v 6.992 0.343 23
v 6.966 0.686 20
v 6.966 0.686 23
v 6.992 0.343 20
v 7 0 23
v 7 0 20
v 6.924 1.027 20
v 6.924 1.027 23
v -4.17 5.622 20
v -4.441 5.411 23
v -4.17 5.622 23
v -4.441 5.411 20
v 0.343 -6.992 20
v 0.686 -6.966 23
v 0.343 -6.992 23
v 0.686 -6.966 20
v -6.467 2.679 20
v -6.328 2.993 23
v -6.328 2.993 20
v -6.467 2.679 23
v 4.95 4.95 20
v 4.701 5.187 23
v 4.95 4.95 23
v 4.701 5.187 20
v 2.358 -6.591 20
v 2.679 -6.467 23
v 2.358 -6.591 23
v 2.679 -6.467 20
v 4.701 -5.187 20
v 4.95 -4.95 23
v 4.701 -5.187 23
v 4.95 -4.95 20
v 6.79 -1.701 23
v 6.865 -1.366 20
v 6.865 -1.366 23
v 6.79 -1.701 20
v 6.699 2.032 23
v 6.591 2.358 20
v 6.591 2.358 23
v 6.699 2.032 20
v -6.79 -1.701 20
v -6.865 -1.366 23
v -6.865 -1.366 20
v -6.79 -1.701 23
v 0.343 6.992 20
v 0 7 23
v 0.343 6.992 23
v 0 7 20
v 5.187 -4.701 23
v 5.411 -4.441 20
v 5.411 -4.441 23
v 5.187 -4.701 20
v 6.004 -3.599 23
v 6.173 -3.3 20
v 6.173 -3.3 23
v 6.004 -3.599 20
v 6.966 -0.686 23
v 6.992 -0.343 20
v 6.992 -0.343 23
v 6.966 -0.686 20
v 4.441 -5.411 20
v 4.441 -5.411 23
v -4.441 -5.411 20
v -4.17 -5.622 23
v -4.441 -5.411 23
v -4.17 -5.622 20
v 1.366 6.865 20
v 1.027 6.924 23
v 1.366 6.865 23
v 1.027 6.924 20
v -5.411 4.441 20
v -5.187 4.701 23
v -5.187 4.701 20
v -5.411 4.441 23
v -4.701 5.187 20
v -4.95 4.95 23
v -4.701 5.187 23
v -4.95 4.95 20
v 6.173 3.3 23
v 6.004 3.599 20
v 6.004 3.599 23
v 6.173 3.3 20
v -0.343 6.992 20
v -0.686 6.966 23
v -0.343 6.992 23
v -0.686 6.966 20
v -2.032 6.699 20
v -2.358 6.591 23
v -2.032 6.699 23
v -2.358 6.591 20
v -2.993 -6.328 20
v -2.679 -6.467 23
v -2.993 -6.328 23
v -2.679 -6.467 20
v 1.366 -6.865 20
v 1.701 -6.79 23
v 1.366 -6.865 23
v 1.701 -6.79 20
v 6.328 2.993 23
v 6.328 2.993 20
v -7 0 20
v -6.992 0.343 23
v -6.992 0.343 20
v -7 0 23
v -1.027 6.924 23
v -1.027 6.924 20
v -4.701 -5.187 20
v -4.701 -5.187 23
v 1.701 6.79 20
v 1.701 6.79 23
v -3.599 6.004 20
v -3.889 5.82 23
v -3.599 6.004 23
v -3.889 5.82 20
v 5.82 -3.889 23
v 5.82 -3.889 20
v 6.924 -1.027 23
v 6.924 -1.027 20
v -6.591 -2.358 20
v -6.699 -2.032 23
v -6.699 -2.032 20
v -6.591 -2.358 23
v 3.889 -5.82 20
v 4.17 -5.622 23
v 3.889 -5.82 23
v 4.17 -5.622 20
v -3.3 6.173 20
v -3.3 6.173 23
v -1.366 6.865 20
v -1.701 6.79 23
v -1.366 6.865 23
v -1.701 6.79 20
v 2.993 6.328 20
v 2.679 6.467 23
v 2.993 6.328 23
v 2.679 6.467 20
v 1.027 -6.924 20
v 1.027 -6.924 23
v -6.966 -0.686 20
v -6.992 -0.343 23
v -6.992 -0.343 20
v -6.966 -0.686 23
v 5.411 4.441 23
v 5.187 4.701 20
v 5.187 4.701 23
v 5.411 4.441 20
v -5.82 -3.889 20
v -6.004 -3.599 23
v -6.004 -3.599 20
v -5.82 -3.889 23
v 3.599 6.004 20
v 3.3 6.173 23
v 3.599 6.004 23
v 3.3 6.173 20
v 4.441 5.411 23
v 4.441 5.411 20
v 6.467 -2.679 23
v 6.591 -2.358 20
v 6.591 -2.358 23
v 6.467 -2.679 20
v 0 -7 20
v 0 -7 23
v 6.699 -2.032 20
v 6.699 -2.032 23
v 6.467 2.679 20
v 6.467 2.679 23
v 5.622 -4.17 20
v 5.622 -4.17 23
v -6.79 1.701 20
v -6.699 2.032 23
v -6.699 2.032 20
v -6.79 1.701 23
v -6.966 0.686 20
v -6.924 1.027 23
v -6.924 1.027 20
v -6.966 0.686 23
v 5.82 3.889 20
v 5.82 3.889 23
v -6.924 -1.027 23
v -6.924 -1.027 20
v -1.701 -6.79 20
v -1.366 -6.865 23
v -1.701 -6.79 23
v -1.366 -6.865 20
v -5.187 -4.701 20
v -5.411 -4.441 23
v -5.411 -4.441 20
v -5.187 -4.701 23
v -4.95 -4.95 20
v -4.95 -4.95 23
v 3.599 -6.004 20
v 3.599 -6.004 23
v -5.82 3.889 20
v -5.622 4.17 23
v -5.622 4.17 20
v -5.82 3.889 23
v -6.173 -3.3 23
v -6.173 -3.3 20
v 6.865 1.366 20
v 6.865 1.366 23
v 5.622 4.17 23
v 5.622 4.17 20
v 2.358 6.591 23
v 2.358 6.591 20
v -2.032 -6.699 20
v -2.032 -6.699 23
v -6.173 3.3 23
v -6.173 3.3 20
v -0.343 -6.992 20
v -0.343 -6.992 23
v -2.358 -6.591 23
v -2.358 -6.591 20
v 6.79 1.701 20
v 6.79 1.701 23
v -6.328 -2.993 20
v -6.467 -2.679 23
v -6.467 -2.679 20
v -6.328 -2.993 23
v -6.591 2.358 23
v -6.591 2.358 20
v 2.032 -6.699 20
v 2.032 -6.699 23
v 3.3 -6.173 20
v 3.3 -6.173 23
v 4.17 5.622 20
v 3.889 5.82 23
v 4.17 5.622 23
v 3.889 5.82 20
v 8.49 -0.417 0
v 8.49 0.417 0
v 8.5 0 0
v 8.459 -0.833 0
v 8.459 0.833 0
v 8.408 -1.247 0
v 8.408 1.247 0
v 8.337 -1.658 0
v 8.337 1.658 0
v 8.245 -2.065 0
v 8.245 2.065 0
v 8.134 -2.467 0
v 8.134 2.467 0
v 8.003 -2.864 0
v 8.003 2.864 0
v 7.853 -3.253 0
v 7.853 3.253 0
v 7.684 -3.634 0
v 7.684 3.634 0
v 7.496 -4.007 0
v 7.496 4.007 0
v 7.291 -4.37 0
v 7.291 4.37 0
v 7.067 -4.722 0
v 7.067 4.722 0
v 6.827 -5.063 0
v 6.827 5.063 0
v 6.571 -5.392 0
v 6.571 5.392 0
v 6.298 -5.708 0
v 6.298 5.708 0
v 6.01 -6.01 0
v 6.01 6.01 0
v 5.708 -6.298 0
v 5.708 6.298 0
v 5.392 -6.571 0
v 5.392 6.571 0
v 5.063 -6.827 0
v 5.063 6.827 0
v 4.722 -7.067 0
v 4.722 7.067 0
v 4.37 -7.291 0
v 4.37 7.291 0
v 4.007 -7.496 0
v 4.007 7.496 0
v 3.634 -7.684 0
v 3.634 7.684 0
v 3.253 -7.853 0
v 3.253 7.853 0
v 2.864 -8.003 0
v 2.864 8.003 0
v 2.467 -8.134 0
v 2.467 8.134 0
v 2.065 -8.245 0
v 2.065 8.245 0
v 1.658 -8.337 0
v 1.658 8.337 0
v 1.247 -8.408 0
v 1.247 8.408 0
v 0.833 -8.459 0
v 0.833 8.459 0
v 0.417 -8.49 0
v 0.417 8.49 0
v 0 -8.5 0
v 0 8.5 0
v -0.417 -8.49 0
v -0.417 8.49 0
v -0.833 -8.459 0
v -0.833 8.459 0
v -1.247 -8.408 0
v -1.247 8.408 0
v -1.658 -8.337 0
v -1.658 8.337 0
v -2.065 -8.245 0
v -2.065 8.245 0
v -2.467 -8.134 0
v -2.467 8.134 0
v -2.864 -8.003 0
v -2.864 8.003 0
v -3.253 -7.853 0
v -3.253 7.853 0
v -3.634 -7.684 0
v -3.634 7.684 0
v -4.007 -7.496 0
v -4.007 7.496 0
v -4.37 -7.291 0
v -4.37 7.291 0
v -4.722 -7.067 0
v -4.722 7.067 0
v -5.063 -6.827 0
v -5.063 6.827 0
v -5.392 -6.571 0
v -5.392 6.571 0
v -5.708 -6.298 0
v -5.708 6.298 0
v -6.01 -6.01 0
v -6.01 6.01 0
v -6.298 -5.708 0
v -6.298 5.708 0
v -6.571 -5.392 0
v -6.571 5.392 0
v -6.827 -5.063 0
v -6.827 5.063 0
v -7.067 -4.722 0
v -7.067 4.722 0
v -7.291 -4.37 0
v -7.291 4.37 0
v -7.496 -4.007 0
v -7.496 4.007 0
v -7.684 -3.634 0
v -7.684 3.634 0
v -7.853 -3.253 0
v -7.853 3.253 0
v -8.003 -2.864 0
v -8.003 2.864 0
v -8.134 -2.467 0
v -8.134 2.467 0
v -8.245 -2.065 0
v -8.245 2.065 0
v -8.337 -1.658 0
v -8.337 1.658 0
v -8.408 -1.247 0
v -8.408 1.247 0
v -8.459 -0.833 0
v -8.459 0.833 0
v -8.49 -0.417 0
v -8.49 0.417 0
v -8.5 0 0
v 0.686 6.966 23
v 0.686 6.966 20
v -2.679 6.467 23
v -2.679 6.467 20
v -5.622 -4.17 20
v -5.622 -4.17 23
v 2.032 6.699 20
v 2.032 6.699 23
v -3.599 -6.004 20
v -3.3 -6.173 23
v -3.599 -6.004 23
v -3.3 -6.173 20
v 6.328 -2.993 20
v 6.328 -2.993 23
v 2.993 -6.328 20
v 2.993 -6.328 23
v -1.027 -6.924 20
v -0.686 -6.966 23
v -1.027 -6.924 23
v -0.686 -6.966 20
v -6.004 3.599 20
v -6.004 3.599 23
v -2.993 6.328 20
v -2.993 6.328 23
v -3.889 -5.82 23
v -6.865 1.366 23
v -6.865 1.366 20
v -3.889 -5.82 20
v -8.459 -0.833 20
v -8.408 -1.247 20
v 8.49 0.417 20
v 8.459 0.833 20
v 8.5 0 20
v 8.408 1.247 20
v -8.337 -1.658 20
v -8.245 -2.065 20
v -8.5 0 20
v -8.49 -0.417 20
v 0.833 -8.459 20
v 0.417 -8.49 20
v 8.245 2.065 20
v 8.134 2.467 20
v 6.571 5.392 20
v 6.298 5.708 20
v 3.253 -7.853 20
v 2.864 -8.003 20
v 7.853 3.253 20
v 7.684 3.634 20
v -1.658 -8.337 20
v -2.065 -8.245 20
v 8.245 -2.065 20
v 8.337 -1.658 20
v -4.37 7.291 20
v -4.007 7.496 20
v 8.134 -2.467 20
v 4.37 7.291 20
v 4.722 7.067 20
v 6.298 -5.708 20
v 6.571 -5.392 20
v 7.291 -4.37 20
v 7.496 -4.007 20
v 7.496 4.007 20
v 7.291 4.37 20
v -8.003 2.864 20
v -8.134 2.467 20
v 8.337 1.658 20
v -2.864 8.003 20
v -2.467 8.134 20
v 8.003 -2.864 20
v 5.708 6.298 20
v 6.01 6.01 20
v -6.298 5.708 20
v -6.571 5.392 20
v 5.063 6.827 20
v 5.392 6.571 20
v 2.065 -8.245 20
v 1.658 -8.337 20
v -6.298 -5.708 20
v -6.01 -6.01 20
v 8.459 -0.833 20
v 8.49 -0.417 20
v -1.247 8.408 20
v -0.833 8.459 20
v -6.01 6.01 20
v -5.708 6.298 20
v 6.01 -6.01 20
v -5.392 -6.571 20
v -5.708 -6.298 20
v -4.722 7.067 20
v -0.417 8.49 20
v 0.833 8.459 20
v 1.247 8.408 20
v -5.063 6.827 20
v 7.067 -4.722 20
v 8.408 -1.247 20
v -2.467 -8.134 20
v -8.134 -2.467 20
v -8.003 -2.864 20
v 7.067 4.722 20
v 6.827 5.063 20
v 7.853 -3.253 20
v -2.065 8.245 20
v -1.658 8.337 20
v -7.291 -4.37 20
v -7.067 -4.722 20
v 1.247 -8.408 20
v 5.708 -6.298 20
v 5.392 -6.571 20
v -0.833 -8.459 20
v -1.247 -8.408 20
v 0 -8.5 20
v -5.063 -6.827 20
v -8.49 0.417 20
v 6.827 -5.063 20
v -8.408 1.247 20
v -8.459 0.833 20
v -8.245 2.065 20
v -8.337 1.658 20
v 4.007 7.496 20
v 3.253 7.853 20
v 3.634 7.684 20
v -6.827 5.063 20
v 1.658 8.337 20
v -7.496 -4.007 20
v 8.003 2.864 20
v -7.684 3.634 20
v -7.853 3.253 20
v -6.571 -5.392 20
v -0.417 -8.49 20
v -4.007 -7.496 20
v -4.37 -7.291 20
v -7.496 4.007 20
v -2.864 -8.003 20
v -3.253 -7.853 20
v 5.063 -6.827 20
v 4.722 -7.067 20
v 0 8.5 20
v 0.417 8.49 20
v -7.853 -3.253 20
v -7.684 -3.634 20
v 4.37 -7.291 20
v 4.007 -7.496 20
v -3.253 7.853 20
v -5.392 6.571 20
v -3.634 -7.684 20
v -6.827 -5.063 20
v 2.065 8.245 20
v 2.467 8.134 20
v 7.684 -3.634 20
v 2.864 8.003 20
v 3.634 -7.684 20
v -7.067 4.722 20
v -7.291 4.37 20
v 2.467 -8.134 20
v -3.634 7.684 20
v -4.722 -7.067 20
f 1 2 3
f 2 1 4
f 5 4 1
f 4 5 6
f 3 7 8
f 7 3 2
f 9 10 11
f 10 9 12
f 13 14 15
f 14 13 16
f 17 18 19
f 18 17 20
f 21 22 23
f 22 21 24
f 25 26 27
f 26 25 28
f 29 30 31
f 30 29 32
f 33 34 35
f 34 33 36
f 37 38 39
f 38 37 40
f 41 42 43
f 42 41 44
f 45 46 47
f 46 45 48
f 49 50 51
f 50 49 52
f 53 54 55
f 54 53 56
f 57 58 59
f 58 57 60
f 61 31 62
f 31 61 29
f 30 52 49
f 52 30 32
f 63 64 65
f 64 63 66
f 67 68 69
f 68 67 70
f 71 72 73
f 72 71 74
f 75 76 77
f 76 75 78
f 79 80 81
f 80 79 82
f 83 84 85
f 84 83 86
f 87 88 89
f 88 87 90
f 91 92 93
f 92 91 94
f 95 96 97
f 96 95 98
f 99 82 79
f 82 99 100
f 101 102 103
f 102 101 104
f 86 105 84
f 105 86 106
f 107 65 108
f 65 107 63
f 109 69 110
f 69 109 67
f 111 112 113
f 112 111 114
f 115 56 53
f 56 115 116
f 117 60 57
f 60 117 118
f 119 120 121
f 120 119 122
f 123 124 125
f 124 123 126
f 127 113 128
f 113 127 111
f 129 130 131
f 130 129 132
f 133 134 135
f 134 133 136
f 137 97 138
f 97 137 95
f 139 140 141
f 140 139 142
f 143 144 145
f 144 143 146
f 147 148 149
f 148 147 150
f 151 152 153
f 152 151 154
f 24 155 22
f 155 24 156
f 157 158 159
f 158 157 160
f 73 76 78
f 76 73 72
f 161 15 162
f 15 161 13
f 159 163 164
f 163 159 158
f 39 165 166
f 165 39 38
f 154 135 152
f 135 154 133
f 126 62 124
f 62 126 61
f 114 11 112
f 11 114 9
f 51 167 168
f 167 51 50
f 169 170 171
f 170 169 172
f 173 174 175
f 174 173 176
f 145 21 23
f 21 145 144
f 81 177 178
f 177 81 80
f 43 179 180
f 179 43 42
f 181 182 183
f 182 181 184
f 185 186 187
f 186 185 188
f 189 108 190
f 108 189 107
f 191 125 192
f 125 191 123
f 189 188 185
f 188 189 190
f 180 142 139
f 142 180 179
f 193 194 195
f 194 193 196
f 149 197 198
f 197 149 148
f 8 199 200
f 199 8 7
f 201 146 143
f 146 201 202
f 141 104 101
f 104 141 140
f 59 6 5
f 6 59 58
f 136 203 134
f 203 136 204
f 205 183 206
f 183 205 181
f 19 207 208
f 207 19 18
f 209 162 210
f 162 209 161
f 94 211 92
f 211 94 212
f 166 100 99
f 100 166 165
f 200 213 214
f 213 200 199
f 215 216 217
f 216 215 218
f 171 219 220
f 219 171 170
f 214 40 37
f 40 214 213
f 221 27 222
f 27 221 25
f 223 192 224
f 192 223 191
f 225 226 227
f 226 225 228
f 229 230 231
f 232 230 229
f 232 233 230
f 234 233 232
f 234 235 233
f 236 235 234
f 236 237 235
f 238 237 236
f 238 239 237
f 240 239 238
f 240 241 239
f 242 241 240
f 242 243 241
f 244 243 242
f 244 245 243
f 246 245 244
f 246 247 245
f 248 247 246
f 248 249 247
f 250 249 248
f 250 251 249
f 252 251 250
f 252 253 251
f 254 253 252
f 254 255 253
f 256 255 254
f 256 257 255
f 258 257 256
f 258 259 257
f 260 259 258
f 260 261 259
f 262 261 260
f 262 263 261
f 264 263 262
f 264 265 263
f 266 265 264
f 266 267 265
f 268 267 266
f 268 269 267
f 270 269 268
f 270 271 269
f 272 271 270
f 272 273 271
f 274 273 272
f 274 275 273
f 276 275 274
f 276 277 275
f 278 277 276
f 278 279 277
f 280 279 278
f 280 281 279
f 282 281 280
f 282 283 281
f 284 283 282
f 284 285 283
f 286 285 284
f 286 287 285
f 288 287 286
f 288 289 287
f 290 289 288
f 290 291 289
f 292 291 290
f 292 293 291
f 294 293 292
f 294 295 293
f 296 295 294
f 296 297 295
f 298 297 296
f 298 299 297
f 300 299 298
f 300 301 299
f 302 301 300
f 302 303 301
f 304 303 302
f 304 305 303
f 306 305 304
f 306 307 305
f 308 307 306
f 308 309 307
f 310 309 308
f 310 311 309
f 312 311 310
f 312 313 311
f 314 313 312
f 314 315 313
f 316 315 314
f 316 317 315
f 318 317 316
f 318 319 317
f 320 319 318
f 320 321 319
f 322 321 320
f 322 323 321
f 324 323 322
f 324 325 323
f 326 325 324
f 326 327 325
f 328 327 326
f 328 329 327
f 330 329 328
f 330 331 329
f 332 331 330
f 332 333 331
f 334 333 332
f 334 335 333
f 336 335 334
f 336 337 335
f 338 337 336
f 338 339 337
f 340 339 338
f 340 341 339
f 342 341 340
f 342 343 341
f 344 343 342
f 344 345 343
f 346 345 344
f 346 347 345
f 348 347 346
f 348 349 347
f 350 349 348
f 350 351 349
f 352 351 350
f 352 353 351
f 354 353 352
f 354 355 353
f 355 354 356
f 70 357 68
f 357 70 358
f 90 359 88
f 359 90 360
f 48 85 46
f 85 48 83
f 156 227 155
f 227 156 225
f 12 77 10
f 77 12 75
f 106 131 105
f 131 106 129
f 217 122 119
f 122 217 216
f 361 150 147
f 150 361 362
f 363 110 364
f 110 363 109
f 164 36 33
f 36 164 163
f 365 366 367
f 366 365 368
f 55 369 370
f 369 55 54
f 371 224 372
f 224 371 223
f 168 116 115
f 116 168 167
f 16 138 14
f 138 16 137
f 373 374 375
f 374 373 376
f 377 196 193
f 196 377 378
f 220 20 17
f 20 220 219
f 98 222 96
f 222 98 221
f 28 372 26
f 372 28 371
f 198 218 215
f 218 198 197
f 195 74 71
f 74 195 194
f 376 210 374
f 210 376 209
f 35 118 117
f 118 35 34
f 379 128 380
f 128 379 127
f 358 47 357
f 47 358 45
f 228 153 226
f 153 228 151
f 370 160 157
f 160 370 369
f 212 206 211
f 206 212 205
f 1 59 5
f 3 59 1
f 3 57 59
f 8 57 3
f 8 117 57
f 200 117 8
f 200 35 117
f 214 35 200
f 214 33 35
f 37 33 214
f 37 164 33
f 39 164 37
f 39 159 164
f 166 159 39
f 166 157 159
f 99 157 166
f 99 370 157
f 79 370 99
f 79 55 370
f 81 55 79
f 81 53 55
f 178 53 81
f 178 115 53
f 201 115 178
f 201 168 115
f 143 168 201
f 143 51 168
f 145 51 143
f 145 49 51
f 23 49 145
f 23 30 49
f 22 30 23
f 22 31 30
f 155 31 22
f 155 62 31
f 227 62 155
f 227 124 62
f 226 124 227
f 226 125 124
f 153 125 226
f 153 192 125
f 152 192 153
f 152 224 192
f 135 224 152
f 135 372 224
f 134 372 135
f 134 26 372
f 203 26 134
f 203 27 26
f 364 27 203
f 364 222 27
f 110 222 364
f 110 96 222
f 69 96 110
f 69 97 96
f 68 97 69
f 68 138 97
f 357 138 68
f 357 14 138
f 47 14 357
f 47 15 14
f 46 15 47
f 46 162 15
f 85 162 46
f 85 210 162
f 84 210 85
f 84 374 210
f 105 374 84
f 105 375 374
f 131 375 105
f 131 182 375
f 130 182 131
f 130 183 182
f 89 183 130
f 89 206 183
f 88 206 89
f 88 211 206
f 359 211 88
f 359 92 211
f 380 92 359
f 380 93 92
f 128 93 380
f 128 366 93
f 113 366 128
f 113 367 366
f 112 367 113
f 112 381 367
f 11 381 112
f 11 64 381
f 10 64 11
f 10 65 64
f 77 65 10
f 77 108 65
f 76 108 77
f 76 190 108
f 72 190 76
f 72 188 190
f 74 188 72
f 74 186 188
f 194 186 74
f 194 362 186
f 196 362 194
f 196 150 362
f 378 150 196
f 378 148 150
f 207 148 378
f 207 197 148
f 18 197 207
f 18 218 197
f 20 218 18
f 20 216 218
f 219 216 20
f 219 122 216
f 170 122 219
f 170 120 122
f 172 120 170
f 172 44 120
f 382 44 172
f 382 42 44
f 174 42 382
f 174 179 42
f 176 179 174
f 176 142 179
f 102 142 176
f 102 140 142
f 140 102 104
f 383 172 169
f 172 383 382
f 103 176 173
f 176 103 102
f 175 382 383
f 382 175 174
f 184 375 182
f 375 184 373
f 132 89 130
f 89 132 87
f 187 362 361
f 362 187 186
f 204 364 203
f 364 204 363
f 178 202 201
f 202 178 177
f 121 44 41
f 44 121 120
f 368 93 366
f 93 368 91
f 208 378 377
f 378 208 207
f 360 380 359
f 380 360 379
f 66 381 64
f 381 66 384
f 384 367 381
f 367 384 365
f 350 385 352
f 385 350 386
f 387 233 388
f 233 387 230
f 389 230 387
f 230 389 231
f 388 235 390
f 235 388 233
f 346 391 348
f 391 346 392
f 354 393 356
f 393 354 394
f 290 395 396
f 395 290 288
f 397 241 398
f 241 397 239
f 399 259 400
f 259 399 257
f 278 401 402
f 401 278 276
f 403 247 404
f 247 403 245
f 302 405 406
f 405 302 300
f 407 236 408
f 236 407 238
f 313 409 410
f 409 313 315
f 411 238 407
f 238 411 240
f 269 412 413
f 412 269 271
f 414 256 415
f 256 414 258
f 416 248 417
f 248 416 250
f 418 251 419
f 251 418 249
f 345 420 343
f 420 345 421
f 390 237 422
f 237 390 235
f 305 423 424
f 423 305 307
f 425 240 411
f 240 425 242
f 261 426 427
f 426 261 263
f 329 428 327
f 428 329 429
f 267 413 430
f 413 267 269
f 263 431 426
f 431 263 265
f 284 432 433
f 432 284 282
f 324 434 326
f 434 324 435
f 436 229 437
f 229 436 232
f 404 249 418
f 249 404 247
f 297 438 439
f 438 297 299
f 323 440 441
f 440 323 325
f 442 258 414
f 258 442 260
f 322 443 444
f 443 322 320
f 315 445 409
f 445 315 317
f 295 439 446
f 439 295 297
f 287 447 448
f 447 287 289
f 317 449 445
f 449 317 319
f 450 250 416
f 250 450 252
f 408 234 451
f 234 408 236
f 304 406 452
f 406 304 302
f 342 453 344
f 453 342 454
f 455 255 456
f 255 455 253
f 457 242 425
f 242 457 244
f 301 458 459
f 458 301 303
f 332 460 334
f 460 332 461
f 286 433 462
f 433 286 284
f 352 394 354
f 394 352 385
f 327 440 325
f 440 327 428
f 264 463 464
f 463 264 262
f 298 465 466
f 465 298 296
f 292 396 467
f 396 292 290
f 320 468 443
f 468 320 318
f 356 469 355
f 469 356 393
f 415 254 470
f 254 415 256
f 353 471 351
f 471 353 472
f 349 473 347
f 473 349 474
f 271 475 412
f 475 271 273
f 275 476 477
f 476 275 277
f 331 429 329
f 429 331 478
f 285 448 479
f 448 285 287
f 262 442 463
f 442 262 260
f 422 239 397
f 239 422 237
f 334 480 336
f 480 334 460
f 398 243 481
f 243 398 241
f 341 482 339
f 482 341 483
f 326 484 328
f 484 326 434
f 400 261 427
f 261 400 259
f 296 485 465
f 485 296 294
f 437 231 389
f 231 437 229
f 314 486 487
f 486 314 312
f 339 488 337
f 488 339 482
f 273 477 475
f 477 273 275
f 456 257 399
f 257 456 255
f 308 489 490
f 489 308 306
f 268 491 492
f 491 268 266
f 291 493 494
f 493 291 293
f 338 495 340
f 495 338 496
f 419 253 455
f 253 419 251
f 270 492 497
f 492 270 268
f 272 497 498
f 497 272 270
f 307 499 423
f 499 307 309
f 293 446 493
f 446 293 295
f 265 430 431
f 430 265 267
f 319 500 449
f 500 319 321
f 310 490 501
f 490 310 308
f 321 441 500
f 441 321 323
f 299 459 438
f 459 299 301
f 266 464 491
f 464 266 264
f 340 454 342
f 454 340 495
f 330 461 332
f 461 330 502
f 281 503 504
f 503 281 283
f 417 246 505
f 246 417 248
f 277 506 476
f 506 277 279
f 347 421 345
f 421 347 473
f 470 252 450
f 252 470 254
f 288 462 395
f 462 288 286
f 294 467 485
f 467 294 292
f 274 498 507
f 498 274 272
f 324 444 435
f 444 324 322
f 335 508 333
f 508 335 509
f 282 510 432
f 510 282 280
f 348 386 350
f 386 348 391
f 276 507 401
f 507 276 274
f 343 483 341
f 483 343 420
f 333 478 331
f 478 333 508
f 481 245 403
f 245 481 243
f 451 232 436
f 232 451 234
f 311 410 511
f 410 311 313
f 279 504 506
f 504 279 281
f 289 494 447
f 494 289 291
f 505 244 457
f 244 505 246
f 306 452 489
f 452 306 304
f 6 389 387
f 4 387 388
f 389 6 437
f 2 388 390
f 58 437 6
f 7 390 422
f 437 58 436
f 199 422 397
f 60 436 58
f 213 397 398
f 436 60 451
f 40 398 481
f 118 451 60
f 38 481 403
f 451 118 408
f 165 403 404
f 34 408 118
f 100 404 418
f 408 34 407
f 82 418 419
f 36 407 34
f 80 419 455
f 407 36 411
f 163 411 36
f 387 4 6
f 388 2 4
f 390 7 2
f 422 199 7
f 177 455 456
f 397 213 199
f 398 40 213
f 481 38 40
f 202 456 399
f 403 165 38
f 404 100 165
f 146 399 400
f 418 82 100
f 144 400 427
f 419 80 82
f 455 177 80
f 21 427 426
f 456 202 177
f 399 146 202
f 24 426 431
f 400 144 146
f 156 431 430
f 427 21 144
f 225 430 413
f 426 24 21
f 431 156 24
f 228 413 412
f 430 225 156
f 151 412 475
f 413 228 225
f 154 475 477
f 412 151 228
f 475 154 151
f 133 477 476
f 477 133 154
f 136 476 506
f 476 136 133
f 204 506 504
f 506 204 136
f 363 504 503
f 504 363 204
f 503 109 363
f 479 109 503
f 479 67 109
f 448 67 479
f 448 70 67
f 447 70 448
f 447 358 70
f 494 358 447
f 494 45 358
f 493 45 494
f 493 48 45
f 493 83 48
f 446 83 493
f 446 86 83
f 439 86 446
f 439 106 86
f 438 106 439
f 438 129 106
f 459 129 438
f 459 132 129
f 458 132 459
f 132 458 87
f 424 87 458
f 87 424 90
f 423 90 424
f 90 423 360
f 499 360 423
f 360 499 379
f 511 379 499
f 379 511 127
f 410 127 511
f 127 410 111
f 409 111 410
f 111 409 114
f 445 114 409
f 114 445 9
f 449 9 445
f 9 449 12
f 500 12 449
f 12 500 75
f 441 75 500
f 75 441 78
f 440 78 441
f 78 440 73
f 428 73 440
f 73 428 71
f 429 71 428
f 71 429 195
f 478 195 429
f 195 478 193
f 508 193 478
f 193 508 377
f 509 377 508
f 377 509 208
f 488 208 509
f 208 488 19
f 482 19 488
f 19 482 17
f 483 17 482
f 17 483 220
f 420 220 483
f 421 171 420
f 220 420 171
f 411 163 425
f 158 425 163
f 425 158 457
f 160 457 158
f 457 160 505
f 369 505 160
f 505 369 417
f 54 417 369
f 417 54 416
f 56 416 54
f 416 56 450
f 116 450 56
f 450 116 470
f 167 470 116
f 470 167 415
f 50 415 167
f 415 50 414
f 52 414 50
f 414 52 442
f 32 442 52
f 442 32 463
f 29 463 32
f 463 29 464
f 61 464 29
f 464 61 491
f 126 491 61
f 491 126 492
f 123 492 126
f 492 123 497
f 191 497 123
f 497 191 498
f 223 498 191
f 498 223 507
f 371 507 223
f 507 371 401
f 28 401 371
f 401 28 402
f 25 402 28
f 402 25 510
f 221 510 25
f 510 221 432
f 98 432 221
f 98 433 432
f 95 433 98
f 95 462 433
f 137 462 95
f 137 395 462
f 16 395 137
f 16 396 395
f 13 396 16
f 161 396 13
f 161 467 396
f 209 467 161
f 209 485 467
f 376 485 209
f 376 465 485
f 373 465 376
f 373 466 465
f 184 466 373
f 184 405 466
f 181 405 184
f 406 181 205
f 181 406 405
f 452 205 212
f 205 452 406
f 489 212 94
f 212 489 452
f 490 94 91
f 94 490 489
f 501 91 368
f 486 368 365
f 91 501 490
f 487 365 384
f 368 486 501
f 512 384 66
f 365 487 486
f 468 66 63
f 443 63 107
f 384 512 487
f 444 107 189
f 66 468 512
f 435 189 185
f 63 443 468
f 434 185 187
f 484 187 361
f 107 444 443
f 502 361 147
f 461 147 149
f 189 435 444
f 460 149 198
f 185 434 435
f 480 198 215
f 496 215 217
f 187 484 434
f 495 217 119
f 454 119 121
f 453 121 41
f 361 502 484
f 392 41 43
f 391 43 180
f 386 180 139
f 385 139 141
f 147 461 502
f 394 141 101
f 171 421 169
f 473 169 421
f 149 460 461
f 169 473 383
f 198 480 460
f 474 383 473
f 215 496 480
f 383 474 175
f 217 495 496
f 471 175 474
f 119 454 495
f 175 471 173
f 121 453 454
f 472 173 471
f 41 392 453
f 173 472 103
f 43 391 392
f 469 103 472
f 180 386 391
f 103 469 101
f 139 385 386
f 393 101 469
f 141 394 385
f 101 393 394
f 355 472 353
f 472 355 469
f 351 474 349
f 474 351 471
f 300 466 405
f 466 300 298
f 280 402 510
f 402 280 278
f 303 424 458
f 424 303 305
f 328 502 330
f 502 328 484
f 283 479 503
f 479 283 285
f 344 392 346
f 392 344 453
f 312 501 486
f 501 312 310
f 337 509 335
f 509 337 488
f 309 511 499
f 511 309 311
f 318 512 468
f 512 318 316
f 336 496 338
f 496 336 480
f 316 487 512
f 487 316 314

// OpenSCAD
/* Create a clip that can be used as a cartridge interlock while the 
   motherboard is not in the case */
   
$fn=128;

module interlock_clip() {
    gap = 12;   
    difference() {
        cube([5, 15, gap + 10]);
        translate([-0.5, -0.01, 5]) #cube([6, 10, gap]);        
    }
}

module board_support() {
    cylinder(h=23, d=14);
    cylinder(h=20, d=17);
}



//interlock_clip();
board_support();
